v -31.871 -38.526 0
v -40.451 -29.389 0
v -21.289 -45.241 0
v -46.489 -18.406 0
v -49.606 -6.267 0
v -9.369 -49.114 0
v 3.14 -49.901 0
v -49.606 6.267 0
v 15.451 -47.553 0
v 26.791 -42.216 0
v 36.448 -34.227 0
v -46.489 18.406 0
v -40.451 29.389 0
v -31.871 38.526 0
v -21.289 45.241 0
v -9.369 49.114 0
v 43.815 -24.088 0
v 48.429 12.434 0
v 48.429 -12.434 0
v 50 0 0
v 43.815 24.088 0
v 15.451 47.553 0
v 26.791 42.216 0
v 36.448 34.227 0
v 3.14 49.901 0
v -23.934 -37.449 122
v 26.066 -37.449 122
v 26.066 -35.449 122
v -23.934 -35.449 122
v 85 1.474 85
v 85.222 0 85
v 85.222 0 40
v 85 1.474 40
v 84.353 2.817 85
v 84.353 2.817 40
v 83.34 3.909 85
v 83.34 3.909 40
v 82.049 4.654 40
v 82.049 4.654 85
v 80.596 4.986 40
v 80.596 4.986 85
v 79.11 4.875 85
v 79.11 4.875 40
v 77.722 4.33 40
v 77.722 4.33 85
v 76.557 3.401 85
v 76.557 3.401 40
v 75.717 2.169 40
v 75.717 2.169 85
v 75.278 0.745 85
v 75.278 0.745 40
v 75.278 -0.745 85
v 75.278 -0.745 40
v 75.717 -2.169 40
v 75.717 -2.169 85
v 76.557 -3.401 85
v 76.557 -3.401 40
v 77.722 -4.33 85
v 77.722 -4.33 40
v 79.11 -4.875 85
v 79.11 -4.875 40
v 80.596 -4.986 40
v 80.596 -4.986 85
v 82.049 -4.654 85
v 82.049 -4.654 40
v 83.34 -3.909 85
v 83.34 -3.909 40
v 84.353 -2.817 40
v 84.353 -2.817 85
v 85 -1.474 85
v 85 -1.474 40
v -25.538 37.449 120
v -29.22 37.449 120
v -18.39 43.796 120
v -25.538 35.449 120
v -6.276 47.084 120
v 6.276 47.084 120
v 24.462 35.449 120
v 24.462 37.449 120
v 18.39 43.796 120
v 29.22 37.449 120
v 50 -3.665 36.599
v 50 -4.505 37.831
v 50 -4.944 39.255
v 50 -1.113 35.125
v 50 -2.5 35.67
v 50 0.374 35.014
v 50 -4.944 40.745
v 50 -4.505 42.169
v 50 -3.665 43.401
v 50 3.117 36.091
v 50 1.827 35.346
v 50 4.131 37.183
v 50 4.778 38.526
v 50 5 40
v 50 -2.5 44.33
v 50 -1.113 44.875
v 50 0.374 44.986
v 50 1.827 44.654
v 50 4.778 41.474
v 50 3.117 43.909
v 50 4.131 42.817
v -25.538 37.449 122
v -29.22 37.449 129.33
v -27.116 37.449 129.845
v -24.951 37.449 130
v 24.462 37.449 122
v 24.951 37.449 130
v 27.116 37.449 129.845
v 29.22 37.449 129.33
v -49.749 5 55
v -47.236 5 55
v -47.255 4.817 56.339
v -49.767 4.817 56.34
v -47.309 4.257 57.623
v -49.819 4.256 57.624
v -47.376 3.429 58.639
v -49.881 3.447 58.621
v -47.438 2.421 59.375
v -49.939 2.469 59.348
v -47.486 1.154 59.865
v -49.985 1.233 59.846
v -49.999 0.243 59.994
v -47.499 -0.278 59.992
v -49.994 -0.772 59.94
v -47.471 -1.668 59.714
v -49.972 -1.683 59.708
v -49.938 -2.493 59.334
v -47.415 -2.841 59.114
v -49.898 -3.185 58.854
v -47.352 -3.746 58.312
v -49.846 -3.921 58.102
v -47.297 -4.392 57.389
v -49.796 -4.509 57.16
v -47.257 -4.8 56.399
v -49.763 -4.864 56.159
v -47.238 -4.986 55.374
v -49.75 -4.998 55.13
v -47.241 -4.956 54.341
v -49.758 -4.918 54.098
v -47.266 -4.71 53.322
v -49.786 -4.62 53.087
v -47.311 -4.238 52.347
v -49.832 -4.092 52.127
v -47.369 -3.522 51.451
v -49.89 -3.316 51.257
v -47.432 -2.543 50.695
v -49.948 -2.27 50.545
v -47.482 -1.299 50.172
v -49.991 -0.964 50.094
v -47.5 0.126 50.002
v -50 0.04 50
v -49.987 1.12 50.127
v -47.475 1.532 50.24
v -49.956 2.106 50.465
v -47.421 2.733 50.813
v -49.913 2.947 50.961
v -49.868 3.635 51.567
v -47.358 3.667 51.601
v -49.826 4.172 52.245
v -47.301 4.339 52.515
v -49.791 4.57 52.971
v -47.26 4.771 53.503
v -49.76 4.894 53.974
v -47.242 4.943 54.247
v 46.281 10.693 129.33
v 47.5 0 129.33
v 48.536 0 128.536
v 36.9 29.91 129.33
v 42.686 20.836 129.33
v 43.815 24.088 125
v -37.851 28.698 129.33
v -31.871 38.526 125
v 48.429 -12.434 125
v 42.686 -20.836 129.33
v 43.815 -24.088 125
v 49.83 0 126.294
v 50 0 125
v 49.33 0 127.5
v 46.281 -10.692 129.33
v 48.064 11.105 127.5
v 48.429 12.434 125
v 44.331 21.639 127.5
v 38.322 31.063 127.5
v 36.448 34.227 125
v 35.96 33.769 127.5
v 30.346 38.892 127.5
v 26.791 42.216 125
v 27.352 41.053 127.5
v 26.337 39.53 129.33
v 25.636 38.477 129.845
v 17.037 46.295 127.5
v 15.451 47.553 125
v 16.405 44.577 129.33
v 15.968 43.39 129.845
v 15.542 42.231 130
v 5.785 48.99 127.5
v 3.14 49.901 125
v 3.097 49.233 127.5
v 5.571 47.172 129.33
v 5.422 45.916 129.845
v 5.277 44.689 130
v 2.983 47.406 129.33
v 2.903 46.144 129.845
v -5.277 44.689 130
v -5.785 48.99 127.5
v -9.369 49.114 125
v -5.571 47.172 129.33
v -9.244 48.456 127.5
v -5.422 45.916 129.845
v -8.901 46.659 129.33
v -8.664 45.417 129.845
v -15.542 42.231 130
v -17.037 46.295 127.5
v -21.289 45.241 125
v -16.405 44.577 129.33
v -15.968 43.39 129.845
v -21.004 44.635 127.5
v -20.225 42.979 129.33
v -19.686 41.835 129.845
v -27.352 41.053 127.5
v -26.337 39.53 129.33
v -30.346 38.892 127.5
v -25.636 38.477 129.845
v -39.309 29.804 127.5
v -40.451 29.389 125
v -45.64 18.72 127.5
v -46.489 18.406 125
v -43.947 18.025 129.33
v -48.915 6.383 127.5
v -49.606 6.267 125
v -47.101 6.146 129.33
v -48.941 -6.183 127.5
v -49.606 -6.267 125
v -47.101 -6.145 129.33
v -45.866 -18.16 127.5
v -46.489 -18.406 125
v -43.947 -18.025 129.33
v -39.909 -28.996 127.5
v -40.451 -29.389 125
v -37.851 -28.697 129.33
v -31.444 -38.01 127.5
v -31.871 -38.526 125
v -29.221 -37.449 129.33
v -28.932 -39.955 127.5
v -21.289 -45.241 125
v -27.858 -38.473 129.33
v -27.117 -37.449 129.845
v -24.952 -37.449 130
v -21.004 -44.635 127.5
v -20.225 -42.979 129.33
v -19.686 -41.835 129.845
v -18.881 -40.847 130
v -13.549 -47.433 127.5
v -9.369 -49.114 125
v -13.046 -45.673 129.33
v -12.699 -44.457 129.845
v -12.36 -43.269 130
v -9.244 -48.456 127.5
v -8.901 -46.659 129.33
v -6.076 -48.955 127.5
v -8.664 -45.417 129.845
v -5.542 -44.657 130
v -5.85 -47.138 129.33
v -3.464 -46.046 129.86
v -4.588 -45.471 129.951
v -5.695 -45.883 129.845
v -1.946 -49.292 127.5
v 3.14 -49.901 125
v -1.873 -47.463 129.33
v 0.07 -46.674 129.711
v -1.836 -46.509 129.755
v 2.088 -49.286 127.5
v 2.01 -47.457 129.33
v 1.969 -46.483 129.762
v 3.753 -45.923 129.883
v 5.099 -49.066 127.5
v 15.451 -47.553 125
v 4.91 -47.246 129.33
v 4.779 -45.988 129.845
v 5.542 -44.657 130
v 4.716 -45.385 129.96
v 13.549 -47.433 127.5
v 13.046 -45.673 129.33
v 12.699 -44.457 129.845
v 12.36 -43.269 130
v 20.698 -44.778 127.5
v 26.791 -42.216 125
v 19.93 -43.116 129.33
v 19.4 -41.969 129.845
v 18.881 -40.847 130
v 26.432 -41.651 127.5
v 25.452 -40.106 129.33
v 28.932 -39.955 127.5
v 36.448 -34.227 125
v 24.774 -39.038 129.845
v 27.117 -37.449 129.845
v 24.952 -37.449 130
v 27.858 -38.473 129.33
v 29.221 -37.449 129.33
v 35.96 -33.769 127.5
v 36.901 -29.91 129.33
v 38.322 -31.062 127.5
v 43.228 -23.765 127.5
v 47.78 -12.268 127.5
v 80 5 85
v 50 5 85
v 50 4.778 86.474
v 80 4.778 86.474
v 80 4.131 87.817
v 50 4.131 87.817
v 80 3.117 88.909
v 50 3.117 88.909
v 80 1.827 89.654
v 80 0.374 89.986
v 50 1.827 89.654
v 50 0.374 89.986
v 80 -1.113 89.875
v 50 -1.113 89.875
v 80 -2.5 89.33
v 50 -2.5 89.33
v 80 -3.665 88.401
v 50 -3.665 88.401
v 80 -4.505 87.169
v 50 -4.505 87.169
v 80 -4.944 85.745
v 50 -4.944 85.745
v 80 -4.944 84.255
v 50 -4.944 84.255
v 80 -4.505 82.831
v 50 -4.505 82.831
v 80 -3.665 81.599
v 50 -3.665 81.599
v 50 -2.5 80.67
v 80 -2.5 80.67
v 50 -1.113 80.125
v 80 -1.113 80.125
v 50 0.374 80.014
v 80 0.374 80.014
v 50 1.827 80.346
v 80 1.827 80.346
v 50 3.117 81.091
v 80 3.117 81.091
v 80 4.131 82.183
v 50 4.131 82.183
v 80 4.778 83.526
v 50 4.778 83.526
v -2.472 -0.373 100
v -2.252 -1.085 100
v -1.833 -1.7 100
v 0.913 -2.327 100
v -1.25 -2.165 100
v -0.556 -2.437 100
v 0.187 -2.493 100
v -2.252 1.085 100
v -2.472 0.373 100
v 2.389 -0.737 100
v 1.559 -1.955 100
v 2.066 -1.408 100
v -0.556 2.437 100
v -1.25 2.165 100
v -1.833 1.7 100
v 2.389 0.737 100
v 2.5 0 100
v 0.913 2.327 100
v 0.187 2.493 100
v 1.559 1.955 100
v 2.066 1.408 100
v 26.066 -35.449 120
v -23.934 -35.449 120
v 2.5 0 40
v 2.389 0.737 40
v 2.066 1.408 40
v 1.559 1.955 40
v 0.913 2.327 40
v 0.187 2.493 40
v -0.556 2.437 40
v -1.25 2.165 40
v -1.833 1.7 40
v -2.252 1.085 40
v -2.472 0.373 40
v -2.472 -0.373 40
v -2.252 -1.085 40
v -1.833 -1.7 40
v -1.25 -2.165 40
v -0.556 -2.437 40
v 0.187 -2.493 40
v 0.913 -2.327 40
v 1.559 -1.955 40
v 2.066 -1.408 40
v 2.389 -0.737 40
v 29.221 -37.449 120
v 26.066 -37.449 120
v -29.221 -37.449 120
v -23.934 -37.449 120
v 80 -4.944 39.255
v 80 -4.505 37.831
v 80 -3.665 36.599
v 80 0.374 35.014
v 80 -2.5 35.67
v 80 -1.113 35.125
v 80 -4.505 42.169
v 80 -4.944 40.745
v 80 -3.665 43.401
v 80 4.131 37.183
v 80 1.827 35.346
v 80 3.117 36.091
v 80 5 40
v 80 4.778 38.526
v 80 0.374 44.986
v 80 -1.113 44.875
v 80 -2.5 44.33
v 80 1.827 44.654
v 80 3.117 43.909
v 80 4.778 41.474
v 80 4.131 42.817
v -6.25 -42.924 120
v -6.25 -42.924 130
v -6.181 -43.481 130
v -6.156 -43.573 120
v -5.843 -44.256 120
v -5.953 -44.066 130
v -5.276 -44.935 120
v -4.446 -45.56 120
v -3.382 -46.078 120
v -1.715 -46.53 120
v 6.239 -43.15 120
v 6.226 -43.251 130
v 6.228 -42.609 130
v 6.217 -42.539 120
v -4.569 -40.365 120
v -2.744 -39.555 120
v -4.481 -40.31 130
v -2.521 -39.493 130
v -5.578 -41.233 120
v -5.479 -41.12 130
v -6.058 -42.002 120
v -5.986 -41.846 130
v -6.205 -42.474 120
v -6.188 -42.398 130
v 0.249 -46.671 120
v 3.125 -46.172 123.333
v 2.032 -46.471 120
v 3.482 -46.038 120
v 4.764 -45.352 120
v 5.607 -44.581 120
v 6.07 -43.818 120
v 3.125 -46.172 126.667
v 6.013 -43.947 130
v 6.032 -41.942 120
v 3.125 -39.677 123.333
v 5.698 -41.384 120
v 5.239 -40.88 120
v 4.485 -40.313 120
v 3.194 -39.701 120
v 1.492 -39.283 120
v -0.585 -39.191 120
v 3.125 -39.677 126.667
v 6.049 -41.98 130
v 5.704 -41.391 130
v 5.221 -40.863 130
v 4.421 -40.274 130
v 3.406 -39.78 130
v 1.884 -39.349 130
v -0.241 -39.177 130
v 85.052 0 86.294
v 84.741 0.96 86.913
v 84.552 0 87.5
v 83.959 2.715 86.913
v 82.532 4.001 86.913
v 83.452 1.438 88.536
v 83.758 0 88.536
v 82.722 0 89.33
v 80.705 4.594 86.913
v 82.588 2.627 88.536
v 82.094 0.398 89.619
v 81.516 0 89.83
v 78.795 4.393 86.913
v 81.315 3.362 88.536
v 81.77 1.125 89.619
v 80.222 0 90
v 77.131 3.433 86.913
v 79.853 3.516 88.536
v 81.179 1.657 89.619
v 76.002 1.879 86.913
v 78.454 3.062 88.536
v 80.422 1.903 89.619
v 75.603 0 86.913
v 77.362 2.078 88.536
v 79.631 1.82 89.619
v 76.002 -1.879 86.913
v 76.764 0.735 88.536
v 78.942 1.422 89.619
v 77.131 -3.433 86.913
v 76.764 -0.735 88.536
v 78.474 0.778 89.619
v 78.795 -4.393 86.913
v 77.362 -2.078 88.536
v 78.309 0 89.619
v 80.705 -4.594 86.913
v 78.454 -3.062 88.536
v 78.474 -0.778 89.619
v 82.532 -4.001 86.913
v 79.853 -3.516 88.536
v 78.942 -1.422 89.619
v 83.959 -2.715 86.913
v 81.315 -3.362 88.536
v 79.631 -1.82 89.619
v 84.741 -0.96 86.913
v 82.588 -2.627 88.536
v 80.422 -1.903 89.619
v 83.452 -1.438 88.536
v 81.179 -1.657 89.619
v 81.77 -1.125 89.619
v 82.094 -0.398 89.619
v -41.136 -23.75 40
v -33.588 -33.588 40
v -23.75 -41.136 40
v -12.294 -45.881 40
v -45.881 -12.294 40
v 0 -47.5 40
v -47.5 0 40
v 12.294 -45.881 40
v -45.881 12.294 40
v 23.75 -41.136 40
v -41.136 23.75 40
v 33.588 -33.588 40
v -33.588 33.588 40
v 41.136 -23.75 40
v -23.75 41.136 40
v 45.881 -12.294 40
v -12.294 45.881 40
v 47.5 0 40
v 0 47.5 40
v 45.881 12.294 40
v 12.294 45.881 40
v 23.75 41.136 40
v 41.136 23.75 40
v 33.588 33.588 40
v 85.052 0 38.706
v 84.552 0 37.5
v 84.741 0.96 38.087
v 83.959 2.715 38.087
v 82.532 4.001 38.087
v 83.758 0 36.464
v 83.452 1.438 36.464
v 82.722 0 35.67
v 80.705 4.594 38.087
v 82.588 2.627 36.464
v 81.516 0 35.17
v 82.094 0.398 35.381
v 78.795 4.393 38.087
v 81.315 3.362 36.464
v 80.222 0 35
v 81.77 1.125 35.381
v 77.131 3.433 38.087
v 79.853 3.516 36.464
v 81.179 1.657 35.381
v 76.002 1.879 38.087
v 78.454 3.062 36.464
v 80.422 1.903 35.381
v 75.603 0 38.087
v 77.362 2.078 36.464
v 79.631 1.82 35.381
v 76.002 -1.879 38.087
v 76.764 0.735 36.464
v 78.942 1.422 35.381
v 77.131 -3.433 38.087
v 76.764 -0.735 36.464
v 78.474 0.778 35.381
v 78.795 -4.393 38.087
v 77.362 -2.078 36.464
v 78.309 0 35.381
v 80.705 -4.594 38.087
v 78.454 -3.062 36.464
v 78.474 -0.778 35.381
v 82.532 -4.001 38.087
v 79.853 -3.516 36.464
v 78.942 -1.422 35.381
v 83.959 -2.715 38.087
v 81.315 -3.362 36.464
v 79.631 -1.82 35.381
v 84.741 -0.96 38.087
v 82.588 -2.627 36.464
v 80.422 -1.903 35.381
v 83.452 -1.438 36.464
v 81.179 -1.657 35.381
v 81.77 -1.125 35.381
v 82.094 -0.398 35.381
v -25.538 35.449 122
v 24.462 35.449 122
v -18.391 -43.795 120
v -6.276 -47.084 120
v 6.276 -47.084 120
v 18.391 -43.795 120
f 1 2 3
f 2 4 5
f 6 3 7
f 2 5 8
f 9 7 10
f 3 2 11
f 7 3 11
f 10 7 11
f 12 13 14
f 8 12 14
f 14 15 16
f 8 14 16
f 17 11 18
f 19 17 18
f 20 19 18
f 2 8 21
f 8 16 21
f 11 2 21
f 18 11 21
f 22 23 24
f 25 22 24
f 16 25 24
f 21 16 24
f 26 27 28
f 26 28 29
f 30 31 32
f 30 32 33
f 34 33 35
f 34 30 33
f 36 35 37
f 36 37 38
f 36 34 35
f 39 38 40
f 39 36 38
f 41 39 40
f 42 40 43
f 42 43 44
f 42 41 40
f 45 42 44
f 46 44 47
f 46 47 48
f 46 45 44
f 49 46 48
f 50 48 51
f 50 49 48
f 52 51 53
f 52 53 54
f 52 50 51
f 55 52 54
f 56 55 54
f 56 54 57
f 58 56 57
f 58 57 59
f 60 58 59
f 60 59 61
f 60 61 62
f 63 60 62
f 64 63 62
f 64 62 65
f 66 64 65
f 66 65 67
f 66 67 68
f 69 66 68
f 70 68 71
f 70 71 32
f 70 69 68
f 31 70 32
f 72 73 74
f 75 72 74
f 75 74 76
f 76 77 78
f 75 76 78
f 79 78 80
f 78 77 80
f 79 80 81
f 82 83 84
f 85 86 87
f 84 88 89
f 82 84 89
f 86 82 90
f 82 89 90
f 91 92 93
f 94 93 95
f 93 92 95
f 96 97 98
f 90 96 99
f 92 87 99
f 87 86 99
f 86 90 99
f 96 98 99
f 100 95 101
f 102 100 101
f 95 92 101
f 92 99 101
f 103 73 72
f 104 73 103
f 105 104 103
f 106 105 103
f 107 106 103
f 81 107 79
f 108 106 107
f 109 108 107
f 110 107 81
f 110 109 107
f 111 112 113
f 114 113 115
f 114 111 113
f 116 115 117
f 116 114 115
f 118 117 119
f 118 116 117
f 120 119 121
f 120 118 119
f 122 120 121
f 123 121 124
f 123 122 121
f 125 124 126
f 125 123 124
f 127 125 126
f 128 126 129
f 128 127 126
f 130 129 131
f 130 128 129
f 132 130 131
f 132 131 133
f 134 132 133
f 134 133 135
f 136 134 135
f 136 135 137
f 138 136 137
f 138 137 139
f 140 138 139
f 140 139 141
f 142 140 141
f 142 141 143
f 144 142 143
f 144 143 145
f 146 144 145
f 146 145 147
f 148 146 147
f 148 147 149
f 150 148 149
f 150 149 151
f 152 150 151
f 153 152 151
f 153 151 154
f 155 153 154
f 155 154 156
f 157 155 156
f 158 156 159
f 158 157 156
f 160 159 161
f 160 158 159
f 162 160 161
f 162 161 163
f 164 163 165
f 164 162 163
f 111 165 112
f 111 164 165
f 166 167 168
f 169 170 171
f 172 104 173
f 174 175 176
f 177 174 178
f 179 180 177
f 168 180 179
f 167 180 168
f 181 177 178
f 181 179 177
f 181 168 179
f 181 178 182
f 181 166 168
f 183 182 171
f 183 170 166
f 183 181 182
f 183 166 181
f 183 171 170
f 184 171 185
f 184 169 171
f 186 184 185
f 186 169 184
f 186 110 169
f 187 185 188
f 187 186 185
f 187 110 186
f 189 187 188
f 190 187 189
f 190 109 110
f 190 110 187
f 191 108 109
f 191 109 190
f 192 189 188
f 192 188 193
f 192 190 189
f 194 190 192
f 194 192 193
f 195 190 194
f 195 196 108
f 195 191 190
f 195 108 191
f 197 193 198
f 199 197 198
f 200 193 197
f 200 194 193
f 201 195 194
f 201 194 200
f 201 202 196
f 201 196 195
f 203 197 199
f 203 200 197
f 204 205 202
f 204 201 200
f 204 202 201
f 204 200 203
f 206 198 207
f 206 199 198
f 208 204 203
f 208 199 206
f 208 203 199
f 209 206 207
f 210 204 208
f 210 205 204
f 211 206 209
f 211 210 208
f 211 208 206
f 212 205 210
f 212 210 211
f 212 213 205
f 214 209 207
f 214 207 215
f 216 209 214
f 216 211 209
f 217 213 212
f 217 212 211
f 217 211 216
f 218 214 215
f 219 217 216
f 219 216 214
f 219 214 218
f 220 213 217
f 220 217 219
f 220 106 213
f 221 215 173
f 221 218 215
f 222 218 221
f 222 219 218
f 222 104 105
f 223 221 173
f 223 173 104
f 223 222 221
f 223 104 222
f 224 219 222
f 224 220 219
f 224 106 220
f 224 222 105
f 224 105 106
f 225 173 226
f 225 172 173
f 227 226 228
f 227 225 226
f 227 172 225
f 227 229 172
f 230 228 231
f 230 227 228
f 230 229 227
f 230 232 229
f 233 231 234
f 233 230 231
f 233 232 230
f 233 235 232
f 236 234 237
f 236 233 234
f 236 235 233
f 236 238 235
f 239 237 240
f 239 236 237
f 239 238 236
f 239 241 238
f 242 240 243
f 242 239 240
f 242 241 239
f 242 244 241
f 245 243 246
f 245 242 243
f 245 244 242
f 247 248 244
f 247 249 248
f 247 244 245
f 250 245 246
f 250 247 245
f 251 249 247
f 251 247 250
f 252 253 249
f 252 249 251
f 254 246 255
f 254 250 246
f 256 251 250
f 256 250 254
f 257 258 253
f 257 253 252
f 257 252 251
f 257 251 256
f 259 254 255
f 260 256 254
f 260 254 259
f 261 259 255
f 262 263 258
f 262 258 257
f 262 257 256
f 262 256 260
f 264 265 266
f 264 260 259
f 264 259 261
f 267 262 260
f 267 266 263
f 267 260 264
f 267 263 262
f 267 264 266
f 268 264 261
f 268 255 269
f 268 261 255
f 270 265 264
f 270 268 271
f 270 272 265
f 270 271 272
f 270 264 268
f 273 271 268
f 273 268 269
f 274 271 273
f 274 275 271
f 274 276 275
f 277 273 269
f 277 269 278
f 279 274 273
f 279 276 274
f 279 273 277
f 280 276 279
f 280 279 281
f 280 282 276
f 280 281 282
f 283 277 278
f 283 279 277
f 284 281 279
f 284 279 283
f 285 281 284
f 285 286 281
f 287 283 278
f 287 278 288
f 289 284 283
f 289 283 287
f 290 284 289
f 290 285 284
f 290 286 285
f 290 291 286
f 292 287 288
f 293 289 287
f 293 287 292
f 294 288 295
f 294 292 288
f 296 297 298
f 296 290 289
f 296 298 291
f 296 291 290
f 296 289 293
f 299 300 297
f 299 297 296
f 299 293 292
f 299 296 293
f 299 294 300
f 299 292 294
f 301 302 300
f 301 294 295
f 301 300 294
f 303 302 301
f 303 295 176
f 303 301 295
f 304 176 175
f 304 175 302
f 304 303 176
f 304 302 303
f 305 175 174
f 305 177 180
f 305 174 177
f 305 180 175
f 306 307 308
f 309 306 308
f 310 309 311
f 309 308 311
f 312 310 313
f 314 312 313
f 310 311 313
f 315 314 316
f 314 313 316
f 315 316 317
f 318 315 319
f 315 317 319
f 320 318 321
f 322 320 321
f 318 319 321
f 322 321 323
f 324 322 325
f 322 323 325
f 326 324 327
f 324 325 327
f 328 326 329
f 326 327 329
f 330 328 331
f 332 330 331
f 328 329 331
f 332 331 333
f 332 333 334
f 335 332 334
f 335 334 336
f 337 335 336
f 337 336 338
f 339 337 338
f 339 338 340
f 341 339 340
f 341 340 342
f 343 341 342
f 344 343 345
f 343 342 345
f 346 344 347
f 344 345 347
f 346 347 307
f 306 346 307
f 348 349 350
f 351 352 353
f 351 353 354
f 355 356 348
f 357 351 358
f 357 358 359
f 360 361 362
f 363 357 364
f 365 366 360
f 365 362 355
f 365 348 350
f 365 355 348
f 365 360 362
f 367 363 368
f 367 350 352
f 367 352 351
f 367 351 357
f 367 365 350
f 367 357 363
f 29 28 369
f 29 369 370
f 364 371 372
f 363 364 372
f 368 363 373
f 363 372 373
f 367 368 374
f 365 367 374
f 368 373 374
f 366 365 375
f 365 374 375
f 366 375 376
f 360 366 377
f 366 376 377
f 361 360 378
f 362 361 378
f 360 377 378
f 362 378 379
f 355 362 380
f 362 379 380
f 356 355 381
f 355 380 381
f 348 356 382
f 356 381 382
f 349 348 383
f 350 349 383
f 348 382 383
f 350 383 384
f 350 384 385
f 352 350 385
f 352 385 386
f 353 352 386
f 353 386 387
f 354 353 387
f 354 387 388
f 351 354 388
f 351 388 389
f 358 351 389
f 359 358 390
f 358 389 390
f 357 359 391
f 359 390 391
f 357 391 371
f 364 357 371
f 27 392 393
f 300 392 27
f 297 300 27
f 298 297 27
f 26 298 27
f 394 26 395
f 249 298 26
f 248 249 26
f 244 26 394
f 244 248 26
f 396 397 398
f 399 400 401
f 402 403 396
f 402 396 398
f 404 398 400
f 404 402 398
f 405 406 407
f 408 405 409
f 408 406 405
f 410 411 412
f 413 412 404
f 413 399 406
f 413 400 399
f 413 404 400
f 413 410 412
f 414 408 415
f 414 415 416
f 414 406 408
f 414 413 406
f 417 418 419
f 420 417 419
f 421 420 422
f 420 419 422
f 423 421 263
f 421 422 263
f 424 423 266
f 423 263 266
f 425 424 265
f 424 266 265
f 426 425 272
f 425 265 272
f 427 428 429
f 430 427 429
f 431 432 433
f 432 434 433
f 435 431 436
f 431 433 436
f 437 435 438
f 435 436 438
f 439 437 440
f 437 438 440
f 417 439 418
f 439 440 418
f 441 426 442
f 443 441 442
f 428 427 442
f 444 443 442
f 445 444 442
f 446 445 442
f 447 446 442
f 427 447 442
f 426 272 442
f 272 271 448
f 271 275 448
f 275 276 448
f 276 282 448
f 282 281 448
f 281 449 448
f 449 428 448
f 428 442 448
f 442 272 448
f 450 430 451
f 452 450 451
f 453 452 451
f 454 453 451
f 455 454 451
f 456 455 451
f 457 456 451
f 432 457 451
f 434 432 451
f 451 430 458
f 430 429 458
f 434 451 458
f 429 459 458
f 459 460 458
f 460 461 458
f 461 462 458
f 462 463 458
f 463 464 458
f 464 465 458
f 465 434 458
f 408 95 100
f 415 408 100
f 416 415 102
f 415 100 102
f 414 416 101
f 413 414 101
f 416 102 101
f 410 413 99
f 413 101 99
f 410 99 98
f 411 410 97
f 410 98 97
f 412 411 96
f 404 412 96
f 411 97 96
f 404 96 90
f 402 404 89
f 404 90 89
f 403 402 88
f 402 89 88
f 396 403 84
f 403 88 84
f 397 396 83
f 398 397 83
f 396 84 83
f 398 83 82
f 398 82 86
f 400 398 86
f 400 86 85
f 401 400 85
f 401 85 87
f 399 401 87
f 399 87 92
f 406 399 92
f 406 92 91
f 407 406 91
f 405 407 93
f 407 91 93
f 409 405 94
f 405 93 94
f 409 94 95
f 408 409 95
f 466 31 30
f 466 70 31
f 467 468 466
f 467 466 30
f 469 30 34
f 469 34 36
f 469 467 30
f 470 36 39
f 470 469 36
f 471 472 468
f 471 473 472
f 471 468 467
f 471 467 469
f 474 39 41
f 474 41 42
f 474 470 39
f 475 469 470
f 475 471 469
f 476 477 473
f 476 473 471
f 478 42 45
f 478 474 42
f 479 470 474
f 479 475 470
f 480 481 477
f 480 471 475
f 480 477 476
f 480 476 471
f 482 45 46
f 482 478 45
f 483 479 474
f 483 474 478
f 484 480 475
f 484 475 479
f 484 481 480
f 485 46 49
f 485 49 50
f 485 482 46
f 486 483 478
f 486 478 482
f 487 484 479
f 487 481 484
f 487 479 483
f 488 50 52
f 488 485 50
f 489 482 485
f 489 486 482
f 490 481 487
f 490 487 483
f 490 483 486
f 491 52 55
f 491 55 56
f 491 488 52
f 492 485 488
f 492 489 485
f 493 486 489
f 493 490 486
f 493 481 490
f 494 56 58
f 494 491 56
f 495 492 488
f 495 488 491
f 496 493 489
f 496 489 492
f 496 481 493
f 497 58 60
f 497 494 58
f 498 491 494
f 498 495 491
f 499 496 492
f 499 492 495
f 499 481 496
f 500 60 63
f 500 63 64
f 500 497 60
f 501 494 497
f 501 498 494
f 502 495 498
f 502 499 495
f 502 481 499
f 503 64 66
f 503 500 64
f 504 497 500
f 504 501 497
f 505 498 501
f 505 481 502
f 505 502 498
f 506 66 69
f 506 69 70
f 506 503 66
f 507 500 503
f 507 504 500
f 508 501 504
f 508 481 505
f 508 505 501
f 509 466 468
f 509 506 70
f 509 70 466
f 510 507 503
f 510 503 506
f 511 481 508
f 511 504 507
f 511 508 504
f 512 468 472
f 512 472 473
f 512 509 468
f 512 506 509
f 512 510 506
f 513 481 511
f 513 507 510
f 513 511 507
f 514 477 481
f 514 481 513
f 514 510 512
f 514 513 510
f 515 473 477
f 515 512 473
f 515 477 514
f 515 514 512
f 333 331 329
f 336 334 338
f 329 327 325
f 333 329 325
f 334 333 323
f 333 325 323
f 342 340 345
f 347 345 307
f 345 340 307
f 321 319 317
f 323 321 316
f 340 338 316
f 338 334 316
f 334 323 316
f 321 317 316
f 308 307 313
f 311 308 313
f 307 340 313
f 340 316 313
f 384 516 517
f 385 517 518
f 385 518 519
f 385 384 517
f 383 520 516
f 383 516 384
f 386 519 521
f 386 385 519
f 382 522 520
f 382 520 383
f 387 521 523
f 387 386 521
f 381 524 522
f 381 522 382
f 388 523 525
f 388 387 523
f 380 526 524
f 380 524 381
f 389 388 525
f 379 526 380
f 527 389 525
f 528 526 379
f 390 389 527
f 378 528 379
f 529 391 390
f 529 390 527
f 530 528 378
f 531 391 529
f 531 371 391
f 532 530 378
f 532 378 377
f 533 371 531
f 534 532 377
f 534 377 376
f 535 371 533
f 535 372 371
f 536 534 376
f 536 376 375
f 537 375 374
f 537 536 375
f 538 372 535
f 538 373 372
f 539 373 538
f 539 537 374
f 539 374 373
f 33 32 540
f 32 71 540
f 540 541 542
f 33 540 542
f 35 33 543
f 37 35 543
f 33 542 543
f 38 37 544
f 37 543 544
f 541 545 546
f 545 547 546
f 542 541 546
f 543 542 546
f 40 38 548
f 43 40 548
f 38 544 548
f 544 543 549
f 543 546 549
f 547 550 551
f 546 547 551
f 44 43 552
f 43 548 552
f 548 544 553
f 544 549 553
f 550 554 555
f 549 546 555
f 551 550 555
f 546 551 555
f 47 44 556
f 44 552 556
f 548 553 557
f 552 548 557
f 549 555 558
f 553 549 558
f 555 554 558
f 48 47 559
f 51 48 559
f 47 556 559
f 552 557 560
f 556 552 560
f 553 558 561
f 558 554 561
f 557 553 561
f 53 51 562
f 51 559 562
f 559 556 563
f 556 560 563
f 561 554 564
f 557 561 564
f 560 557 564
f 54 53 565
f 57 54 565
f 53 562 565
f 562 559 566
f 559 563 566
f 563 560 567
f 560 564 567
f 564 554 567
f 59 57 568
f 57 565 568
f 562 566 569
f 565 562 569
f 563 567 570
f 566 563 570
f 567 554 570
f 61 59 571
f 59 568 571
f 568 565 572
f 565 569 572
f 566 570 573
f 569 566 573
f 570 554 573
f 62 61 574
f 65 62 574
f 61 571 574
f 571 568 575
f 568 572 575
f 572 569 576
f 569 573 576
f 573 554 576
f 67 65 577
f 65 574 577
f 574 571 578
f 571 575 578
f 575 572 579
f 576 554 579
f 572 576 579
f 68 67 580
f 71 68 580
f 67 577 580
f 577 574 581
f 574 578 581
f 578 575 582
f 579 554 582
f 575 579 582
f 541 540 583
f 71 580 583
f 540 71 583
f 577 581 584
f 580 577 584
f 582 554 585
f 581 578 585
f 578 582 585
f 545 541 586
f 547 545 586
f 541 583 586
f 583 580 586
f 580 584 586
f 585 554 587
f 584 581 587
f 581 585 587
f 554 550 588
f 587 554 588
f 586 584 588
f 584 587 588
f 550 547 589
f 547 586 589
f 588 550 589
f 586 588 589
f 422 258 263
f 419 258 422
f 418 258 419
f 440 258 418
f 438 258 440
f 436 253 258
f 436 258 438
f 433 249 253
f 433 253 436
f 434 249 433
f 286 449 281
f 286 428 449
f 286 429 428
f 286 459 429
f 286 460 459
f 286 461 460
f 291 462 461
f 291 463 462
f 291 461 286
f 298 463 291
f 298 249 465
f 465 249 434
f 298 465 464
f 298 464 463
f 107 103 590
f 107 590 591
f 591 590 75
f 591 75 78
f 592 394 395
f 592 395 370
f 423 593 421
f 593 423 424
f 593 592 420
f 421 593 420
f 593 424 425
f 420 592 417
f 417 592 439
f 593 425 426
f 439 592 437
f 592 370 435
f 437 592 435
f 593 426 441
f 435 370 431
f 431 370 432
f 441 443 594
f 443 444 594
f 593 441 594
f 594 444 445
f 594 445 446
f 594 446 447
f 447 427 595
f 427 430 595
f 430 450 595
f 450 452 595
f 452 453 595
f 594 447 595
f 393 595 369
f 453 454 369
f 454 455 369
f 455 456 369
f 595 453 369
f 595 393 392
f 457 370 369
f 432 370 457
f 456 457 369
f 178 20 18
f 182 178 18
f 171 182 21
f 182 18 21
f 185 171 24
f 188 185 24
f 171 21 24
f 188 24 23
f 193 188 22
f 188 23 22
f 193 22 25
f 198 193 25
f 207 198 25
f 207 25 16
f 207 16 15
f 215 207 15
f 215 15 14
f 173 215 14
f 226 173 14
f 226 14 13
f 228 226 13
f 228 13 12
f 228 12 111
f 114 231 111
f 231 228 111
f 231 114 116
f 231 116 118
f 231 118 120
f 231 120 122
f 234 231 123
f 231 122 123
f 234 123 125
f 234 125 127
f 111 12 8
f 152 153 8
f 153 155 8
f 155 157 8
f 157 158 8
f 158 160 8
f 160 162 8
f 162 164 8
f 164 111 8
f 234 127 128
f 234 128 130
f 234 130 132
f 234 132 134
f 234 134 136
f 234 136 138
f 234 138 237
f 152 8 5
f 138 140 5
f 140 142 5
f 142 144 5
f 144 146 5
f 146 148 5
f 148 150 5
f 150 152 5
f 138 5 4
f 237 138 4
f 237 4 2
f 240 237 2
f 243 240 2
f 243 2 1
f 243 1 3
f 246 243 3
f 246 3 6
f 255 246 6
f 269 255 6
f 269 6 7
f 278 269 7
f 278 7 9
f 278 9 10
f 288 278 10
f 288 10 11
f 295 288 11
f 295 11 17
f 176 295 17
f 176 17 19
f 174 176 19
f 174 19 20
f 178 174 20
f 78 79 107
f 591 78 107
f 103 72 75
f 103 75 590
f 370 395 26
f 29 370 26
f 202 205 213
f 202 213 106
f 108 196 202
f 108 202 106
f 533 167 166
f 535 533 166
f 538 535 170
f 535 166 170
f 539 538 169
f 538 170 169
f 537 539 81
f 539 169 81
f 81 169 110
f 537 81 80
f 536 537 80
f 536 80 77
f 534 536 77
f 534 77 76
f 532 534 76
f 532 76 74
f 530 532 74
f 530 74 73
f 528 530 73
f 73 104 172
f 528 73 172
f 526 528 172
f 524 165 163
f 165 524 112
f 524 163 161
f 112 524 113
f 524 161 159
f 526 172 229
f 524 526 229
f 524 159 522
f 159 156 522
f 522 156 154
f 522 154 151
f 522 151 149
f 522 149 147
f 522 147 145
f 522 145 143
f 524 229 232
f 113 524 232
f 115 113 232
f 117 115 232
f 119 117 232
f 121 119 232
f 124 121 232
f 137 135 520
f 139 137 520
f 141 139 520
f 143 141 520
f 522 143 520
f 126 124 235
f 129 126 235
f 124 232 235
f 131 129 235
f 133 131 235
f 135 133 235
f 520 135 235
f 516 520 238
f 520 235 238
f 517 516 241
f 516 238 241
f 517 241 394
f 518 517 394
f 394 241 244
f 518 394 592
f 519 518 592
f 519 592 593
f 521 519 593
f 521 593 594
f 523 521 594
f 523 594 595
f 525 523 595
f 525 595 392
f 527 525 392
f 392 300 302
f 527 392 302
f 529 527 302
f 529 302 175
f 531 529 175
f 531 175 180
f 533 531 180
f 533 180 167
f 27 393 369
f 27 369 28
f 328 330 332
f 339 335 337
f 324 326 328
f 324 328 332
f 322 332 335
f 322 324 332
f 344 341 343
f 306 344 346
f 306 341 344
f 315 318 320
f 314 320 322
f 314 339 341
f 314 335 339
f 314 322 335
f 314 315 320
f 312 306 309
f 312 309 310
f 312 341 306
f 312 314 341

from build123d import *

# Parameters (mm, degrees)
F0_R      = 50
F1_DEPTH  = 130
F2_R      = 47.5
F3_DEPTH  = 90
F5_DEPTH  = 10
F7_DEPTH  = 10
F9_DEPTH  = 10
F10_W     = 50
F10_H     = 2
F11_DEPTH = 2
F14_R     = 5
F15_DEPTH = 30
F20_R     = 5
F21_DEPTH = 55
F22_R     = 5
F18_R     = 5
F23_DEPTH = 25
F24_W     = 50
F24_H     = 2
F25_DEPTH = 2
F26_R     = 2.5
F27_DEPTH = 60


# Not quite as in the source:
# - a fillet or chamfer that OpenCascade refuses, or shapes differently, is made with other operations: its cross-section is extruded or revolved along the edge and cut away or added


with BuildPart() as f1:
    # F0 (on Top) → F1 (new body)
    with BuildSketch(Plane.XY):
        Circle(F0_R)
    extrude(amount=F1_DEPTH)

    # F2 (on face) → F3 (cut)
    with BuildSketch(Plane.XY.offset(130)):
        Circle(F2_R)
    extrude(amount=-F3_DEPTH, mode=Mode.SUBTRACT)

    # F4 (on face) → F5 (join)
    with BuildSketch(Plane.XY.offset(130)):
        with BuildLine():
            Line((29.2207095994, -37.4486332262), (-29.2207095994, -37.4486332262))
            ThreePointArc((-29.2207095994, -37.4486332262), (0, -47.5), (29.2207095994, -37.4486332262))
        make_face()
    extrude(amount=-F5_DEPTH)

    # F6 (on face) → F7 (cut)
    with BuildSketch(Plane.XY.offset(130)):
        with BuildLine():
            add(Edge.make_bspline(
                [(-6.25, -42.9242551327), (-6.25, -49.4194456611), (3.125, -46.1718503969), (12.5, -42.9242551327), (3.125, -39.6766598685), (-6.25, -36.4290646043), (-6.25, -42.9242551327)],
                knots=[0, 0, 0, 2.0943951024, 2.0943951024, 4.1887902048, 4.1887902048, 6.2831853072, 6.2831853072, 6.2831853072], degree=2, weights=[1, 0.5, 1, 0.5, 1, 0.5, 1]))
        make_face()
    extrude(amount=-F7_DEPTH, mode=Mode.SUBTRACT)

    # F8 (on face) → F9 (join)
    with BuildSketch(Plane.XY.offset(130)):
        with BuildLine():
            ThreePointArc((29.22, 37.4491869071), (0, 47.5), (-29.22, 37.4491869071))
            Line((-29.22, 37.4491869071), (29.22, 37.4491869071))
        make_face()
    extrude(amount=-F9_DEPTH)

    # F10 (on face) → F11 (join)
    with BuildSketch(Plane.XZ.offset(-37.4491869071)):
        with Locations((-0.5380645394, 121)):
            Rectangle(F10_W, F10_H)
    extrude(amount=F11_DEPTH)

    # F12: fillet of radius 5 on 1 edges, made by hand

    # F12_s1 → F12_t2 (revolve, cut)
    with BuildSketch(Plane.XZ):
        with BuildLine():
            ThreePointArc((50, 125), (48.5355339059, 128.5355339059), (45, 130))
            Line((45, 130), (50, 130))
            Line((50, 130), (50, 125))
        make_face()
    revolve(axis=Axis((0, 0, 130), (0, 0, 1)), mode=Mode.SUBTRACT)

    # F18 (on offset) → F23 (cut)
    with BuildSketch(Plane.YZ.offset(-50)):
        with Locations((0, 55)):
            Circle(F18_R)
    extrude(amount=F23_DEPTH, mode=Mode.SUBTRACT)

    # F24 (on face) → F25 (join)
    with BuildSketch(Plane(origin=(0, -37.4486332262, 0), x_dir=(-1, 0, 0), z_dir=(0, 1, 0))):
        with Locations((-1.0655004531, 121)):
            Rectangle(F24_W, F24_H)
    extrude(amount=F25_DEPTH)

    # F26 (on face) → F27 (join)
    with BuildSketch(Plane.XY.offset(40)):
        Circle(F26_R)
    extrude(amount=F27_DEPTH)


with BuildPart() as f15:
    # F14 (on offset) → F15 (new body)
    with BuildSketch(Plane.YZ.offset(50)):
        with Locations((0, 85)):
            Circle(F14_R)
    extrude(amount=F15_DEPTH)


with BuildPart() as f15b:
    # F14 (on offset) → F15, piece 2 (new body)
    with BuildSketch(Plane.YZ.offset(50)):
        with Locations((0, 40)):
            Circle(F14_R)
    extrude(amount=F15_DEPTH)


with BuildPart() as f21:
    # F20 (on offset) → F21 (new body)
    with BuildSketch(Plane.XY.offset(90)):
        with Locations((80.2221212434, 0)):
            Circle(F20_R)
    extrude(amount=-F21_DEPTH)

    # F22
    f22_edges = [f21.edges().sort_by_distance(p)[0] for p in [
        (75.222121, 0, 35),
        (75.222121, 0, 90),
        (85.222121, 0, 62.5),
    ]]
    fillet(f22_edges, radius=F22_R)


solid = Compound([f1.part, f15.part, f15b.part, f21.part])
